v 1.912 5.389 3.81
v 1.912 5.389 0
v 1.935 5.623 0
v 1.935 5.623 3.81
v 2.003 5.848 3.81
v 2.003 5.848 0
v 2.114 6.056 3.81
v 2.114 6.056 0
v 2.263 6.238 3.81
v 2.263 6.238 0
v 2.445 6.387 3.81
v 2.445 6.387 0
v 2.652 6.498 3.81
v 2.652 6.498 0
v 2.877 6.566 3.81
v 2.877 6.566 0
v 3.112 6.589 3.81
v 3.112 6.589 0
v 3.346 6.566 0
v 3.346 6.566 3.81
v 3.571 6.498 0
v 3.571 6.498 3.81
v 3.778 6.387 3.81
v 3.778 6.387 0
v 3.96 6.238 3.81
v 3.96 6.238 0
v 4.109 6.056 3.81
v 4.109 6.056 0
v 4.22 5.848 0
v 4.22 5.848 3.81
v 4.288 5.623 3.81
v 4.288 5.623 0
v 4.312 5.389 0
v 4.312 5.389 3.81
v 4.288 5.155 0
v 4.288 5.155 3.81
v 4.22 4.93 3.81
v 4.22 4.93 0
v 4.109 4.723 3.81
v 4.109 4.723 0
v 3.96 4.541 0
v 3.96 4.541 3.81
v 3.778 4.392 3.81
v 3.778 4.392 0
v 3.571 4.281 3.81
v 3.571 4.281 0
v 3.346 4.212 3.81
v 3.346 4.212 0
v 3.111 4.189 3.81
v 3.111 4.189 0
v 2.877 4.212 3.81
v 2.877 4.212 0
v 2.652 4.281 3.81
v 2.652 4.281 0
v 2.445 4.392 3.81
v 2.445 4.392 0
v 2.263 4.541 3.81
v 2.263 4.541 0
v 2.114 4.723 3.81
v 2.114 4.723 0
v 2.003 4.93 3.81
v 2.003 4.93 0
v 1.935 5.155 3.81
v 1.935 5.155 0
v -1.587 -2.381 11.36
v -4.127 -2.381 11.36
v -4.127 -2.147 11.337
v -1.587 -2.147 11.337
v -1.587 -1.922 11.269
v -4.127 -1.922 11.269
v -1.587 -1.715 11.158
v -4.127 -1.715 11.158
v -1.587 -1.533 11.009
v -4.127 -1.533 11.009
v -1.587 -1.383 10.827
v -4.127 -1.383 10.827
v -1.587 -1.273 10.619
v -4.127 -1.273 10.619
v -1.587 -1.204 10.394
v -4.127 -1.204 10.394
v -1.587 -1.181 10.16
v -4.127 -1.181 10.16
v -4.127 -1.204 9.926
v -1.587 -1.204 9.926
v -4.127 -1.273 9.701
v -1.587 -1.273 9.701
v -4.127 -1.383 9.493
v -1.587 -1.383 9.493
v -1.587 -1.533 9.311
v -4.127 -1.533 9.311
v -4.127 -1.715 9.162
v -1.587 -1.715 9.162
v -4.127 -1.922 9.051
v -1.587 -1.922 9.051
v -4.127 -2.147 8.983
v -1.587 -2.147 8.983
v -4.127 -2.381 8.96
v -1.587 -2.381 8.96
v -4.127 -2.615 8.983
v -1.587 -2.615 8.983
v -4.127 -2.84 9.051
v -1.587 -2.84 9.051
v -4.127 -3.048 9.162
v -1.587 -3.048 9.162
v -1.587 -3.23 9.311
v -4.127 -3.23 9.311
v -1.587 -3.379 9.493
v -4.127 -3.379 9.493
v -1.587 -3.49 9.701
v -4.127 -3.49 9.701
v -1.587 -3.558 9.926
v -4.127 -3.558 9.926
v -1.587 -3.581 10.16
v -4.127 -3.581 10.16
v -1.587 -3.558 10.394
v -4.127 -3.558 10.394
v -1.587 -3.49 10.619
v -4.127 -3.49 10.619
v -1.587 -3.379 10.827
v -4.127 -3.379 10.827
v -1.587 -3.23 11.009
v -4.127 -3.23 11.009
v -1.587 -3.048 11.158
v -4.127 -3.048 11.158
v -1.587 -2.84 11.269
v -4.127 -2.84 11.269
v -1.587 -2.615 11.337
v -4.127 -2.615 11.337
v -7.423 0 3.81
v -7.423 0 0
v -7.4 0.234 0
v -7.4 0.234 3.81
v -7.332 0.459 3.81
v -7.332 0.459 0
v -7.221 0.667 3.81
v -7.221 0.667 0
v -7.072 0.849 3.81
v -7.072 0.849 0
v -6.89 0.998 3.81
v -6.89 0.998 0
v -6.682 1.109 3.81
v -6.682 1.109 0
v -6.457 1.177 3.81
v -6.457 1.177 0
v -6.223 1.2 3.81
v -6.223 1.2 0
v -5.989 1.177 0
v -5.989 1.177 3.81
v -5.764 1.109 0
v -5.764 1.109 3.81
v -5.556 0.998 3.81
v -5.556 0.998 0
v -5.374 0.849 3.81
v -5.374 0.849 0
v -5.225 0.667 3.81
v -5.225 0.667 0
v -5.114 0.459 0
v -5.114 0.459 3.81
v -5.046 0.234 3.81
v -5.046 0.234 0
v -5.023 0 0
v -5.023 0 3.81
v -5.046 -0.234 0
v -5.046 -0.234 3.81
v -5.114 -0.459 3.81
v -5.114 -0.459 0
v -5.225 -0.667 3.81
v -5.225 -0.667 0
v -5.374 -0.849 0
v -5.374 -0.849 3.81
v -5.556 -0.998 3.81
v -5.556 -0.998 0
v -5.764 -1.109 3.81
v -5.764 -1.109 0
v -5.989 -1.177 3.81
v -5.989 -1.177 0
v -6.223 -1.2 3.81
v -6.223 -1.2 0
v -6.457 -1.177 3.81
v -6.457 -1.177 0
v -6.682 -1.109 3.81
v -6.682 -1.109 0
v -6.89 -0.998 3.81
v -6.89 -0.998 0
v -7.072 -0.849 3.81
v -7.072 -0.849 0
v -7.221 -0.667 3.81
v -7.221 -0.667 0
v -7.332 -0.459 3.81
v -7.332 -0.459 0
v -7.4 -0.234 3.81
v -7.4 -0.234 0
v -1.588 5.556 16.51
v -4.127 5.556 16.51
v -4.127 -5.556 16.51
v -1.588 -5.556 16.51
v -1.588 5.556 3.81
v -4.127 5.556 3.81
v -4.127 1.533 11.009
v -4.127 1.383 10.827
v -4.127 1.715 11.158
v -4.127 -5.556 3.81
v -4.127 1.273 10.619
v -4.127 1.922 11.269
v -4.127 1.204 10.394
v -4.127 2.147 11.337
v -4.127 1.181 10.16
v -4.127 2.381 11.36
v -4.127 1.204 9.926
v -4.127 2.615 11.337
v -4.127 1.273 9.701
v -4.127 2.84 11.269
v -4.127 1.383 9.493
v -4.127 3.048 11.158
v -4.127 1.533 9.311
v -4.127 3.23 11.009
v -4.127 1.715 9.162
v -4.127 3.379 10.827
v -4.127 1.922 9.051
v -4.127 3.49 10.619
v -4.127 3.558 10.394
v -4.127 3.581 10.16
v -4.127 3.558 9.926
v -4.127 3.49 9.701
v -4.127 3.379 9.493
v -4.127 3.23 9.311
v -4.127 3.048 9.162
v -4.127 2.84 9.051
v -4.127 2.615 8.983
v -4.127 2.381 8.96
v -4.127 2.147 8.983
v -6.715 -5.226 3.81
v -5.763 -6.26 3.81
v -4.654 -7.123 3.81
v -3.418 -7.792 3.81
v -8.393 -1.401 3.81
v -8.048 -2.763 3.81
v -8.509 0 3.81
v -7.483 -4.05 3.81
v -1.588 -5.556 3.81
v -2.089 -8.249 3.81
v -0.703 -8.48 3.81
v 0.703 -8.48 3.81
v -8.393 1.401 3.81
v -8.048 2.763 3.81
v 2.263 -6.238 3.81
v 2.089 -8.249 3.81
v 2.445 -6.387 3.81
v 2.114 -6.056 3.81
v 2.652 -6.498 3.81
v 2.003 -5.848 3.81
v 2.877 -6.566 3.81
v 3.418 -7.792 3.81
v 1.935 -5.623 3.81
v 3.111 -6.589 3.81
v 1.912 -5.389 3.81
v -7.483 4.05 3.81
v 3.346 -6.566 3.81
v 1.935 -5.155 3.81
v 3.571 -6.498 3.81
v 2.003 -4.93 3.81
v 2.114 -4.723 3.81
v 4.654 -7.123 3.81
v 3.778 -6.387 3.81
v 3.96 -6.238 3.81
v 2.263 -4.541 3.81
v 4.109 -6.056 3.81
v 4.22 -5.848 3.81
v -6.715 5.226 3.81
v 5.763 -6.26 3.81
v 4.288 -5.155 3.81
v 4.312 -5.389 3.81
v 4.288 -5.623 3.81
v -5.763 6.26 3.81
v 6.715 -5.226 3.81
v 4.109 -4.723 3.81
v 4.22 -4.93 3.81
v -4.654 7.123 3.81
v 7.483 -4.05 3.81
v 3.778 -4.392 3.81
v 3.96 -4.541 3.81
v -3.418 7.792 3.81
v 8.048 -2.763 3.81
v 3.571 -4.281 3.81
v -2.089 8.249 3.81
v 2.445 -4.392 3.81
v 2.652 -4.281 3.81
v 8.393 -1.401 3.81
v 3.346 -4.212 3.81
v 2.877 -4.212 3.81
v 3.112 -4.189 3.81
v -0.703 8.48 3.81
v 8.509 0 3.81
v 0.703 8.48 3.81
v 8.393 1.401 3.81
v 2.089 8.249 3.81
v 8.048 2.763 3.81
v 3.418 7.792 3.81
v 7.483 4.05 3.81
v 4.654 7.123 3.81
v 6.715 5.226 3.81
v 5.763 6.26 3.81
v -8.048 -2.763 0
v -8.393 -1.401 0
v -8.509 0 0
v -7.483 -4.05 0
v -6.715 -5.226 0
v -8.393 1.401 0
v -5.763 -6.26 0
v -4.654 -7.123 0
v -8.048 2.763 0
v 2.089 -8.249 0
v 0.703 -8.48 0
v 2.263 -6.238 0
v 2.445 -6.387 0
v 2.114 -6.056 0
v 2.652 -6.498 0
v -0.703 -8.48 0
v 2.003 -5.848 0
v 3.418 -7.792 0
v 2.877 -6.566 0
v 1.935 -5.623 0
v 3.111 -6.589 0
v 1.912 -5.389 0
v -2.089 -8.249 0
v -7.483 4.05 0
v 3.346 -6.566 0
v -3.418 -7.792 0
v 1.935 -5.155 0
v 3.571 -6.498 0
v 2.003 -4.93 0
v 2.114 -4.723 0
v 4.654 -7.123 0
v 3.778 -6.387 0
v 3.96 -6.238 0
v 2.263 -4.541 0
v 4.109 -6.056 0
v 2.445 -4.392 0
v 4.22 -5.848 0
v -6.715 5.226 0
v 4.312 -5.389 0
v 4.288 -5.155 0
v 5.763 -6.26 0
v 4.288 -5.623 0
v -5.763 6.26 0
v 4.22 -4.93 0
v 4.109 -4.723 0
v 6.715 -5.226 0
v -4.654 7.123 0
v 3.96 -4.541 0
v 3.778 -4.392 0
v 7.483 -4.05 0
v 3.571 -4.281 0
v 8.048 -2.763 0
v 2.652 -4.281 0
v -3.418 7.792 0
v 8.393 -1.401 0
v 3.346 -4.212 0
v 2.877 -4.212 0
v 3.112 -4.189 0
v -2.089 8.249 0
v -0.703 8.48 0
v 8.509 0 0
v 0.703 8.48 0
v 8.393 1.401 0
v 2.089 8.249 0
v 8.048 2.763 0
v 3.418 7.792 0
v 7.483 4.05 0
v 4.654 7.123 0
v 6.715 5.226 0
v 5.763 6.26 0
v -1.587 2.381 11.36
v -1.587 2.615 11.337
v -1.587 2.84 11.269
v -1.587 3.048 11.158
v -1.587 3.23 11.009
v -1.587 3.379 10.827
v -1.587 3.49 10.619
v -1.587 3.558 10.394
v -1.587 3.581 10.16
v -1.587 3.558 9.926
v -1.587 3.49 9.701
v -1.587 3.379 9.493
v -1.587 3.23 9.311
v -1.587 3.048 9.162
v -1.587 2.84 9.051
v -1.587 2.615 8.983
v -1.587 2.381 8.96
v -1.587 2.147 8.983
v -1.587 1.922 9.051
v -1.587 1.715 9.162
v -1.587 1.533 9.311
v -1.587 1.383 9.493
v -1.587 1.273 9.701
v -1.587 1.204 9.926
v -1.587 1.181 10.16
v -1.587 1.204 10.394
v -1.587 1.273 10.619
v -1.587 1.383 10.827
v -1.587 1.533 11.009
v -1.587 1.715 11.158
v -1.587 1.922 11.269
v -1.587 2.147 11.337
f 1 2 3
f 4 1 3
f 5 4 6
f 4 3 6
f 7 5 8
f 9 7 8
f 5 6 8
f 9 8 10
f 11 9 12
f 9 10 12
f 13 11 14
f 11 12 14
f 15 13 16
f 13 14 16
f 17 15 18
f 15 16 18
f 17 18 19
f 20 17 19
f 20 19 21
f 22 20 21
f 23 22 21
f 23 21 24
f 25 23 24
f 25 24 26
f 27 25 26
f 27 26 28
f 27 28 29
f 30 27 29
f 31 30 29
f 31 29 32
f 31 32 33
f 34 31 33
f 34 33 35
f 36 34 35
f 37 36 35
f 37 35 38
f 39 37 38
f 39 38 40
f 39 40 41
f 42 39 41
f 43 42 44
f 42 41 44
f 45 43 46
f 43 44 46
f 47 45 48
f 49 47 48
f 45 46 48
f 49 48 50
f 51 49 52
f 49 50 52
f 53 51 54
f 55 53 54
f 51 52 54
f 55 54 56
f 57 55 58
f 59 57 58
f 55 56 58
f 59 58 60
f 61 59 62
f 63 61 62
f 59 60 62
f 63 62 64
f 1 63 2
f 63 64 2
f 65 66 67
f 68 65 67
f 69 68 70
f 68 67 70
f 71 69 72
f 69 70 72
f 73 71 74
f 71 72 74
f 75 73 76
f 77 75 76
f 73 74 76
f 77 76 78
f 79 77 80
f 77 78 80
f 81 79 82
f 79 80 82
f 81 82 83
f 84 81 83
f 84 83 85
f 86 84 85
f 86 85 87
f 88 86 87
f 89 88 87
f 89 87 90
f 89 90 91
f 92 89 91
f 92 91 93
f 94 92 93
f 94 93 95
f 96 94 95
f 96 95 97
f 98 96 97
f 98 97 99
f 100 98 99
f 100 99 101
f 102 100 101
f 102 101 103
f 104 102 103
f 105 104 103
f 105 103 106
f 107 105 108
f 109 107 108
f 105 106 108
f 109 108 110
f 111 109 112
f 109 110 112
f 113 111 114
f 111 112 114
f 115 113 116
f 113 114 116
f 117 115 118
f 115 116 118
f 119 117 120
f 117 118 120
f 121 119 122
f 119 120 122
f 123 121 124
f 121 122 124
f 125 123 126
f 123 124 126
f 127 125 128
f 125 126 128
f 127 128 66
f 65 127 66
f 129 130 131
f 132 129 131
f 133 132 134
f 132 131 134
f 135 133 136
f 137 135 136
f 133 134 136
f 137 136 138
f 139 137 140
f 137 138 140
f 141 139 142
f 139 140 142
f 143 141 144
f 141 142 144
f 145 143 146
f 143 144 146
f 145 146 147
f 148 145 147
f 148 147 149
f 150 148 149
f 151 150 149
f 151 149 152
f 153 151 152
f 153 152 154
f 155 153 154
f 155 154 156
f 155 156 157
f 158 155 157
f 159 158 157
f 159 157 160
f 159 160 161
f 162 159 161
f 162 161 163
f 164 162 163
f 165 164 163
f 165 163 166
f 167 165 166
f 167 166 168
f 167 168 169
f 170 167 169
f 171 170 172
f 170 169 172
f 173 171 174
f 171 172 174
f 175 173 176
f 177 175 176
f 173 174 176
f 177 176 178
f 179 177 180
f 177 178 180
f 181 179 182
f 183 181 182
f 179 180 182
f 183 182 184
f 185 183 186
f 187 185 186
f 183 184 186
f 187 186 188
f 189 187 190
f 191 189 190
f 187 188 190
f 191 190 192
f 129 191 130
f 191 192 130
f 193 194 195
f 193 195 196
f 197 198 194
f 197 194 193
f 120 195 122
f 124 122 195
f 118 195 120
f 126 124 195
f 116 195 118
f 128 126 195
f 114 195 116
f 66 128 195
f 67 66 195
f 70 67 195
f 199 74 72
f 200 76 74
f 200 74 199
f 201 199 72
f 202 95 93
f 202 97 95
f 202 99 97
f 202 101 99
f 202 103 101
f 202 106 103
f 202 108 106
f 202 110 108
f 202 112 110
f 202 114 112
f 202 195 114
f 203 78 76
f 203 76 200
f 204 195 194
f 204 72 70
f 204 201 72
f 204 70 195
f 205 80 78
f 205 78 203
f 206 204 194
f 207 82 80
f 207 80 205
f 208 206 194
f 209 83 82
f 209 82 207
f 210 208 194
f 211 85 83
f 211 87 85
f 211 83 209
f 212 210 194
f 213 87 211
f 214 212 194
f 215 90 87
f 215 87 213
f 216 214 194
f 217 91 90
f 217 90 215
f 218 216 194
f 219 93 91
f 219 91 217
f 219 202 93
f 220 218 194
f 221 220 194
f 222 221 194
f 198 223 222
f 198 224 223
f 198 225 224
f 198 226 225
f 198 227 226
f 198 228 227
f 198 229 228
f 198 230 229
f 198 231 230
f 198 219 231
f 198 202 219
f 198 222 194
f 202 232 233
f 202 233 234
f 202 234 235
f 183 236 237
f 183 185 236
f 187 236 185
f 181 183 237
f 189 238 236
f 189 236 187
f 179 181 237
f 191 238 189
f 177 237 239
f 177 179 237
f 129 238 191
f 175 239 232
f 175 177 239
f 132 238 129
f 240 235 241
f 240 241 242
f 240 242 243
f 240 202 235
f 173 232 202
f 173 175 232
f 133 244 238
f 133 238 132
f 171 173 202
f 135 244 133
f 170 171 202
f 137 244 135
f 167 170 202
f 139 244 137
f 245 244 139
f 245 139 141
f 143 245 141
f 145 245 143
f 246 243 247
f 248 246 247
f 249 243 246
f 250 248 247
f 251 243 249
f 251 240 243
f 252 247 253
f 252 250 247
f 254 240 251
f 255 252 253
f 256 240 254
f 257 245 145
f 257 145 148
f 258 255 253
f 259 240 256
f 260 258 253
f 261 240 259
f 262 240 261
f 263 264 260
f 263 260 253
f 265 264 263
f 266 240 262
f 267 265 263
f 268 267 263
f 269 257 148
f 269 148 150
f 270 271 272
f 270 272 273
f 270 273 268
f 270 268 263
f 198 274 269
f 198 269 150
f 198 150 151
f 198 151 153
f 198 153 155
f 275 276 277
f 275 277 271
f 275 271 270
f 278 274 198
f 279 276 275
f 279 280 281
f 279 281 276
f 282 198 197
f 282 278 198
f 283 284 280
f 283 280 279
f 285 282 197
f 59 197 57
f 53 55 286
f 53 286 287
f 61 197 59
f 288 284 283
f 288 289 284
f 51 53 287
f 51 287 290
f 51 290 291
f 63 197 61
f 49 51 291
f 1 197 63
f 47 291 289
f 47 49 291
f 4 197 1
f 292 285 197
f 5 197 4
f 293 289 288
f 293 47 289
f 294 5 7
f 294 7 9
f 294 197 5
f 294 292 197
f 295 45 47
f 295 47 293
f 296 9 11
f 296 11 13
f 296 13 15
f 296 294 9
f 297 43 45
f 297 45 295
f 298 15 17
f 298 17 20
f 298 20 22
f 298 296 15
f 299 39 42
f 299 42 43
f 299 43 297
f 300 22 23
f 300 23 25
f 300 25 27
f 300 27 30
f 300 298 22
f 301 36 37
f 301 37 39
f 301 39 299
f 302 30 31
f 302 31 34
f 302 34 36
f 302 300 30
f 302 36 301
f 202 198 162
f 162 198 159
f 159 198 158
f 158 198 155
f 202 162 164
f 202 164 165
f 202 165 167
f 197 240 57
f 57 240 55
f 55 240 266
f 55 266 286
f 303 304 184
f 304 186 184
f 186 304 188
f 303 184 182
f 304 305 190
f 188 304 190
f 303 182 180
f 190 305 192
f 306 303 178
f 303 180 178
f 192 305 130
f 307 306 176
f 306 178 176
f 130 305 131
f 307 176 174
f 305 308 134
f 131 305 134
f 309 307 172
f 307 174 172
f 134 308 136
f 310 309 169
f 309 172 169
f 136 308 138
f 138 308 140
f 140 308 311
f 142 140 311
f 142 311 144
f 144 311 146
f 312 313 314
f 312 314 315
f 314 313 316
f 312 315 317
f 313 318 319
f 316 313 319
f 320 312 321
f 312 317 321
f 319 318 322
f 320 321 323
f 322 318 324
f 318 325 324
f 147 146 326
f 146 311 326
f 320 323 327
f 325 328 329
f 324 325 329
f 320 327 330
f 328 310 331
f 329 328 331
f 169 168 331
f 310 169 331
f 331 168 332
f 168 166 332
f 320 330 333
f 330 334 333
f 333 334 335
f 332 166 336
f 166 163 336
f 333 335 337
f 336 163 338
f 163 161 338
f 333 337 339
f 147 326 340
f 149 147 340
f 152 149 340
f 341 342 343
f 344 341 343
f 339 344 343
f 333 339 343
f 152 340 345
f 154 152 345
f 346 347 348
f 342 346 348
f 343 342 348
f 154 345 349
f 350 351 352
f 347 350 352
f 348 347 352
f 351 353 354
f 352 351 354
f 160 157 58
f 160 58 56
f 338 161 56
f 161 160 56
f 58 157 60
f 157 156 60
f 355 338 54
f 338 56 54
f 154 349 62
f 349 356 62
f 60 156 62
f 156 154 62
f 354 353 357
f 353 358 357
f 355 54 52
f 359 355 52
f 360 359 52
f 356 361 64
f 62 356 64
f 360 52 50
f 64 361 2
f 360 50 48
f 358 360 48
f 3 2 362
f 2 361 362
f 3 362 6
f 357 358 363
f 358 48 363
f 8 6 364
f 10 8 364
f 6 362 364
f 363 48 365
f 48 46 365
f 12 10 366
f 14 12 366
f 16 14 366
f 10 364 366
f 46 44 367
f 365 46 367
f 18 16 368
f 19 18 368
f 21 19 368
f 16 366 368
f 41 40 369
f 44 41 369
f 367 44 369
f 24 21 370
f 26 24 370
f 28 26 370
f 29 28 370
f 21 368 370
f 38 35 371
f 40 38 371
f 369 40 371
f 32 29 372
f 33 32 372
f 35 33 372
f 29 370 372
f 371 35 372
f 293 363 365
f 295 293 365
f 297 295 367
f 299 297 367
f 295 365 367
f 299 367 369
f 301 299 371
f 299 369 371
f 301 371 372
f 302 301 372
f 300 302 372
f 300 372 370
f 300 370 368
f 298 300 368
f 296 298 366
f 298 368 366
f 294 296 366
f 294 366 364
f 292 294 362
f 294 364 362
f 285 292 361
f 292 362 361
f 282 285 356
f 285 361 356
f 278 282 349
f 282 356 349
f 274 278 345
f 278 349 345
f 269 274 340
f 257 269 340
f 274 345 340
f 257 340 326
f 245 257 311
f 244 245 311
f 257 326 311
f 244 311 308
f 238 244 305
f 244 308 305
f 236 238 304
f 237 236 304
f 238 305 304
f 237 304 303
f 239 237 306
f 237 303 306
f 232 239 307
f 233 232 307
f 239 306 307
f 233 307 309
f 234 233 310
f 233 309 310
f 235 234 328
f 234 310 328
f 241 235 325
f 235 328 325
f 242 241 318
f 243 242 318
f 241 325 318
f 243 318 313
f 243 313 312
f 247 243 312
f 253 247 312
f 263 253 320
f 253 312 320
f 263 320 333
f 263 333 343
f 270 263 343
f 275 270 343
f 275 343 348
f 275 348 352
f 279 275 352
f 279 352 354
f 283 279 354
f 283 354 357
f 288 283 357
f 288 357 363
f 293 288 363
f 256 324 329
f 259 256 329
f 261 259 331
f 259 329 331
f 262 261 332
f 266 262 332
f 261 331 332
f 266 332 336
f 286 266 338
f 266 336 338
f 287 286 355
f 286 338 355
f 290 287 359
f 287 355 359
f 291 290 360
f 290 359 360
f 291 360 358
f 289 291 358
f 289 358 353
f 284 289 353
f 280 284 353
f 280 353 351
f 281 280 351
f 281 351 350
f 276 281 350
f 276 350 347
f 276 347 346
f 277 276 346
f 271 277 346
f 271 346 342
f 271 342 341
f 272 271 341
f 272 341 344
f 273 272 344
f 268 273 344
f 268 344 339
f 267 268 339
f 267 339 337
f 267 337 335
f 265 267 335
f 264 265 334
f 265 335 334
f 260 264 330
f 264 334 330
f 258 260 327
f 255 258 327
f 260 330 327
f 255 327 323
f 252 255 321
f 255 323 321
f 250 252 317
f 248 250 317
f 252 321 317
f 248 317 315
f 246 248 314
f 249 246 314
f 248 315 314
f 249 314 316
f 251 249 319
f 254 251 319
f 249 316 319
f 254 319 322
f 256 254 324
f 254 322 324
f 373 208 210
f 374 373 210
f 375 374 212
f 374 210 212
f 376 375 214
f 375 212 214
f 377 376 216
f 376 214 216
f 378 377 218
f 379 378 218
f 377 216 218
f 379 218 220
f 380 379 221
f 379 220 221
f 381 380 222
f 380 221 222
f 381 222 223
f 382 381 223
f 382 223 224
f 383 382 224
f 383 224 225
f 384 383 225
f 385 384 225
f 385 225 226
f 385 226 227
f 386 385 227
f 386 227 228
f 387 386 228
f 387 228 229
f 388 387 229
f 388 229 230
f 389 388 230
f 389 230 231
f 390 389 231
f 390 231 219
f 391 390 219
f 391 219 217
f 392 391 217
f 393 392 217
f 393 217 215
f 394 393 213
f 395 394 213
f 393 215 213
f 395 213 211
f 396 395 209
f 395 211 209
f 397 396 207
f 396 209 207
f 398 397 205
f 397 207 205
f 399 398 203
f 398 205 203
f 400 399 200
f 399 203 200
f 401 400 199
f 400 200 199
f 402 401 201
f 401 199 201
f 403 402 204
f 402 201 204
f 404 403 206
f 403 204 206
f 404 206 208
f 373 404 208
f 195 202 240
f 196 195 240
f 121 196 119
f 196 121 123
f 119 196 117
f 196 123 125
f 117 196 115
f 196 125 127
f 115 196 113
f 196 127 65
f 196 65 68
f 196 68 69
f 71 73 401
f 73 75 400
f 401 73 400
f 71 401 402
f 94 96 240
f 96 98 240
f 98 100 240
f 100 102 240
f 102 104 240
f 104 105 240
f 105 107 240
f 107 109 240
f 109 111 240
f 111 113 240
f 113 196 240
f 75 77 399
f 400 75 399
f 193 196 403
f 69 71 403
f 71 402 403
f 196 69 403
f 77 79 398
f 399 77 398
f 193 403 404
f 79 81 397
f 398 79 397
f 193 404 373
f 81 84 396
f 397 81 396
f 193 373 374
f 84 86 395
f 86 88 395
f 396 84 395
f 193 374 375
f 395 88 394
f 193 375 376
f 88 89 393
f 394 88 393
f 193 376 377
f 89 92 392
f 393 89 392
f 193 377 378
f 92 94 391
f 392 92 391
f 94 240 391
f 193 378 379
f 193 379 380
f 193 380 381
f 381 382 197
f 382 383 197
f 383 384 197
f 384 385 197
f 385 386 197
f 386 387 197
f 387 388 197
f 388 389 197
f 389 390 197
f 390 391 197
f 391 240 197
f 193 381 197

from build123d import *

# Parameters (mm, degrees)
SKETCH2_R            = 8.509
BOSS_EXTRUDE1_DEPTH  = 3.81
SKETCH4_W            = 2.54
SKETCH4_H            = 11.1125
BOSS_EXTRUDE2_DEPTH  = 12.7
M2_CLEARANCE_HOLE1_D = 2.4
M2_CLEARANCE_HOLE2_D = 2.4


with BuildPart() as part:
    # Sketch2 → Boss-Extrude1 (new body)
    with BuildSketch(Plane.XY):
        Circle(SKETCH2_R)
    extrude(amount=BOSS_EXTRUDE1_DEPTH)

    # Sketch4 → Boss-Extrude2 (add)
    with BuildSketch(Plane.XY.offset(3.81)):
        with Locations((-2.8575, 0)):
            Rectangle(SKETCH4_W, SKETCH4_H)
    extrude(amount=BOSS_EXTRUDE2_DEPTH)

    # M2 Clearance Hole1 (through all)
    with Locations(Plane.XY.offset(3.81)):
        with Locations((-6.223, 0), (3.1115, 5.389276088), (3.1115, -5.389276088)):
            Hole(M2_CLEARANCE_HOLE1_D / 2)

    # M2 Clearance Hole2 (through all)
    with Locations(Plane(origin=(-1.5875, 0, 0), x_dir=(0, 0, -1), z_dir=(1, 0, 0))):
        with Locations((-10.16, -2.38125), (-10.16, 2.38125)):
            Hole(M2_CLEARANCE_HOLE2_D / 2)


solid = part.part
